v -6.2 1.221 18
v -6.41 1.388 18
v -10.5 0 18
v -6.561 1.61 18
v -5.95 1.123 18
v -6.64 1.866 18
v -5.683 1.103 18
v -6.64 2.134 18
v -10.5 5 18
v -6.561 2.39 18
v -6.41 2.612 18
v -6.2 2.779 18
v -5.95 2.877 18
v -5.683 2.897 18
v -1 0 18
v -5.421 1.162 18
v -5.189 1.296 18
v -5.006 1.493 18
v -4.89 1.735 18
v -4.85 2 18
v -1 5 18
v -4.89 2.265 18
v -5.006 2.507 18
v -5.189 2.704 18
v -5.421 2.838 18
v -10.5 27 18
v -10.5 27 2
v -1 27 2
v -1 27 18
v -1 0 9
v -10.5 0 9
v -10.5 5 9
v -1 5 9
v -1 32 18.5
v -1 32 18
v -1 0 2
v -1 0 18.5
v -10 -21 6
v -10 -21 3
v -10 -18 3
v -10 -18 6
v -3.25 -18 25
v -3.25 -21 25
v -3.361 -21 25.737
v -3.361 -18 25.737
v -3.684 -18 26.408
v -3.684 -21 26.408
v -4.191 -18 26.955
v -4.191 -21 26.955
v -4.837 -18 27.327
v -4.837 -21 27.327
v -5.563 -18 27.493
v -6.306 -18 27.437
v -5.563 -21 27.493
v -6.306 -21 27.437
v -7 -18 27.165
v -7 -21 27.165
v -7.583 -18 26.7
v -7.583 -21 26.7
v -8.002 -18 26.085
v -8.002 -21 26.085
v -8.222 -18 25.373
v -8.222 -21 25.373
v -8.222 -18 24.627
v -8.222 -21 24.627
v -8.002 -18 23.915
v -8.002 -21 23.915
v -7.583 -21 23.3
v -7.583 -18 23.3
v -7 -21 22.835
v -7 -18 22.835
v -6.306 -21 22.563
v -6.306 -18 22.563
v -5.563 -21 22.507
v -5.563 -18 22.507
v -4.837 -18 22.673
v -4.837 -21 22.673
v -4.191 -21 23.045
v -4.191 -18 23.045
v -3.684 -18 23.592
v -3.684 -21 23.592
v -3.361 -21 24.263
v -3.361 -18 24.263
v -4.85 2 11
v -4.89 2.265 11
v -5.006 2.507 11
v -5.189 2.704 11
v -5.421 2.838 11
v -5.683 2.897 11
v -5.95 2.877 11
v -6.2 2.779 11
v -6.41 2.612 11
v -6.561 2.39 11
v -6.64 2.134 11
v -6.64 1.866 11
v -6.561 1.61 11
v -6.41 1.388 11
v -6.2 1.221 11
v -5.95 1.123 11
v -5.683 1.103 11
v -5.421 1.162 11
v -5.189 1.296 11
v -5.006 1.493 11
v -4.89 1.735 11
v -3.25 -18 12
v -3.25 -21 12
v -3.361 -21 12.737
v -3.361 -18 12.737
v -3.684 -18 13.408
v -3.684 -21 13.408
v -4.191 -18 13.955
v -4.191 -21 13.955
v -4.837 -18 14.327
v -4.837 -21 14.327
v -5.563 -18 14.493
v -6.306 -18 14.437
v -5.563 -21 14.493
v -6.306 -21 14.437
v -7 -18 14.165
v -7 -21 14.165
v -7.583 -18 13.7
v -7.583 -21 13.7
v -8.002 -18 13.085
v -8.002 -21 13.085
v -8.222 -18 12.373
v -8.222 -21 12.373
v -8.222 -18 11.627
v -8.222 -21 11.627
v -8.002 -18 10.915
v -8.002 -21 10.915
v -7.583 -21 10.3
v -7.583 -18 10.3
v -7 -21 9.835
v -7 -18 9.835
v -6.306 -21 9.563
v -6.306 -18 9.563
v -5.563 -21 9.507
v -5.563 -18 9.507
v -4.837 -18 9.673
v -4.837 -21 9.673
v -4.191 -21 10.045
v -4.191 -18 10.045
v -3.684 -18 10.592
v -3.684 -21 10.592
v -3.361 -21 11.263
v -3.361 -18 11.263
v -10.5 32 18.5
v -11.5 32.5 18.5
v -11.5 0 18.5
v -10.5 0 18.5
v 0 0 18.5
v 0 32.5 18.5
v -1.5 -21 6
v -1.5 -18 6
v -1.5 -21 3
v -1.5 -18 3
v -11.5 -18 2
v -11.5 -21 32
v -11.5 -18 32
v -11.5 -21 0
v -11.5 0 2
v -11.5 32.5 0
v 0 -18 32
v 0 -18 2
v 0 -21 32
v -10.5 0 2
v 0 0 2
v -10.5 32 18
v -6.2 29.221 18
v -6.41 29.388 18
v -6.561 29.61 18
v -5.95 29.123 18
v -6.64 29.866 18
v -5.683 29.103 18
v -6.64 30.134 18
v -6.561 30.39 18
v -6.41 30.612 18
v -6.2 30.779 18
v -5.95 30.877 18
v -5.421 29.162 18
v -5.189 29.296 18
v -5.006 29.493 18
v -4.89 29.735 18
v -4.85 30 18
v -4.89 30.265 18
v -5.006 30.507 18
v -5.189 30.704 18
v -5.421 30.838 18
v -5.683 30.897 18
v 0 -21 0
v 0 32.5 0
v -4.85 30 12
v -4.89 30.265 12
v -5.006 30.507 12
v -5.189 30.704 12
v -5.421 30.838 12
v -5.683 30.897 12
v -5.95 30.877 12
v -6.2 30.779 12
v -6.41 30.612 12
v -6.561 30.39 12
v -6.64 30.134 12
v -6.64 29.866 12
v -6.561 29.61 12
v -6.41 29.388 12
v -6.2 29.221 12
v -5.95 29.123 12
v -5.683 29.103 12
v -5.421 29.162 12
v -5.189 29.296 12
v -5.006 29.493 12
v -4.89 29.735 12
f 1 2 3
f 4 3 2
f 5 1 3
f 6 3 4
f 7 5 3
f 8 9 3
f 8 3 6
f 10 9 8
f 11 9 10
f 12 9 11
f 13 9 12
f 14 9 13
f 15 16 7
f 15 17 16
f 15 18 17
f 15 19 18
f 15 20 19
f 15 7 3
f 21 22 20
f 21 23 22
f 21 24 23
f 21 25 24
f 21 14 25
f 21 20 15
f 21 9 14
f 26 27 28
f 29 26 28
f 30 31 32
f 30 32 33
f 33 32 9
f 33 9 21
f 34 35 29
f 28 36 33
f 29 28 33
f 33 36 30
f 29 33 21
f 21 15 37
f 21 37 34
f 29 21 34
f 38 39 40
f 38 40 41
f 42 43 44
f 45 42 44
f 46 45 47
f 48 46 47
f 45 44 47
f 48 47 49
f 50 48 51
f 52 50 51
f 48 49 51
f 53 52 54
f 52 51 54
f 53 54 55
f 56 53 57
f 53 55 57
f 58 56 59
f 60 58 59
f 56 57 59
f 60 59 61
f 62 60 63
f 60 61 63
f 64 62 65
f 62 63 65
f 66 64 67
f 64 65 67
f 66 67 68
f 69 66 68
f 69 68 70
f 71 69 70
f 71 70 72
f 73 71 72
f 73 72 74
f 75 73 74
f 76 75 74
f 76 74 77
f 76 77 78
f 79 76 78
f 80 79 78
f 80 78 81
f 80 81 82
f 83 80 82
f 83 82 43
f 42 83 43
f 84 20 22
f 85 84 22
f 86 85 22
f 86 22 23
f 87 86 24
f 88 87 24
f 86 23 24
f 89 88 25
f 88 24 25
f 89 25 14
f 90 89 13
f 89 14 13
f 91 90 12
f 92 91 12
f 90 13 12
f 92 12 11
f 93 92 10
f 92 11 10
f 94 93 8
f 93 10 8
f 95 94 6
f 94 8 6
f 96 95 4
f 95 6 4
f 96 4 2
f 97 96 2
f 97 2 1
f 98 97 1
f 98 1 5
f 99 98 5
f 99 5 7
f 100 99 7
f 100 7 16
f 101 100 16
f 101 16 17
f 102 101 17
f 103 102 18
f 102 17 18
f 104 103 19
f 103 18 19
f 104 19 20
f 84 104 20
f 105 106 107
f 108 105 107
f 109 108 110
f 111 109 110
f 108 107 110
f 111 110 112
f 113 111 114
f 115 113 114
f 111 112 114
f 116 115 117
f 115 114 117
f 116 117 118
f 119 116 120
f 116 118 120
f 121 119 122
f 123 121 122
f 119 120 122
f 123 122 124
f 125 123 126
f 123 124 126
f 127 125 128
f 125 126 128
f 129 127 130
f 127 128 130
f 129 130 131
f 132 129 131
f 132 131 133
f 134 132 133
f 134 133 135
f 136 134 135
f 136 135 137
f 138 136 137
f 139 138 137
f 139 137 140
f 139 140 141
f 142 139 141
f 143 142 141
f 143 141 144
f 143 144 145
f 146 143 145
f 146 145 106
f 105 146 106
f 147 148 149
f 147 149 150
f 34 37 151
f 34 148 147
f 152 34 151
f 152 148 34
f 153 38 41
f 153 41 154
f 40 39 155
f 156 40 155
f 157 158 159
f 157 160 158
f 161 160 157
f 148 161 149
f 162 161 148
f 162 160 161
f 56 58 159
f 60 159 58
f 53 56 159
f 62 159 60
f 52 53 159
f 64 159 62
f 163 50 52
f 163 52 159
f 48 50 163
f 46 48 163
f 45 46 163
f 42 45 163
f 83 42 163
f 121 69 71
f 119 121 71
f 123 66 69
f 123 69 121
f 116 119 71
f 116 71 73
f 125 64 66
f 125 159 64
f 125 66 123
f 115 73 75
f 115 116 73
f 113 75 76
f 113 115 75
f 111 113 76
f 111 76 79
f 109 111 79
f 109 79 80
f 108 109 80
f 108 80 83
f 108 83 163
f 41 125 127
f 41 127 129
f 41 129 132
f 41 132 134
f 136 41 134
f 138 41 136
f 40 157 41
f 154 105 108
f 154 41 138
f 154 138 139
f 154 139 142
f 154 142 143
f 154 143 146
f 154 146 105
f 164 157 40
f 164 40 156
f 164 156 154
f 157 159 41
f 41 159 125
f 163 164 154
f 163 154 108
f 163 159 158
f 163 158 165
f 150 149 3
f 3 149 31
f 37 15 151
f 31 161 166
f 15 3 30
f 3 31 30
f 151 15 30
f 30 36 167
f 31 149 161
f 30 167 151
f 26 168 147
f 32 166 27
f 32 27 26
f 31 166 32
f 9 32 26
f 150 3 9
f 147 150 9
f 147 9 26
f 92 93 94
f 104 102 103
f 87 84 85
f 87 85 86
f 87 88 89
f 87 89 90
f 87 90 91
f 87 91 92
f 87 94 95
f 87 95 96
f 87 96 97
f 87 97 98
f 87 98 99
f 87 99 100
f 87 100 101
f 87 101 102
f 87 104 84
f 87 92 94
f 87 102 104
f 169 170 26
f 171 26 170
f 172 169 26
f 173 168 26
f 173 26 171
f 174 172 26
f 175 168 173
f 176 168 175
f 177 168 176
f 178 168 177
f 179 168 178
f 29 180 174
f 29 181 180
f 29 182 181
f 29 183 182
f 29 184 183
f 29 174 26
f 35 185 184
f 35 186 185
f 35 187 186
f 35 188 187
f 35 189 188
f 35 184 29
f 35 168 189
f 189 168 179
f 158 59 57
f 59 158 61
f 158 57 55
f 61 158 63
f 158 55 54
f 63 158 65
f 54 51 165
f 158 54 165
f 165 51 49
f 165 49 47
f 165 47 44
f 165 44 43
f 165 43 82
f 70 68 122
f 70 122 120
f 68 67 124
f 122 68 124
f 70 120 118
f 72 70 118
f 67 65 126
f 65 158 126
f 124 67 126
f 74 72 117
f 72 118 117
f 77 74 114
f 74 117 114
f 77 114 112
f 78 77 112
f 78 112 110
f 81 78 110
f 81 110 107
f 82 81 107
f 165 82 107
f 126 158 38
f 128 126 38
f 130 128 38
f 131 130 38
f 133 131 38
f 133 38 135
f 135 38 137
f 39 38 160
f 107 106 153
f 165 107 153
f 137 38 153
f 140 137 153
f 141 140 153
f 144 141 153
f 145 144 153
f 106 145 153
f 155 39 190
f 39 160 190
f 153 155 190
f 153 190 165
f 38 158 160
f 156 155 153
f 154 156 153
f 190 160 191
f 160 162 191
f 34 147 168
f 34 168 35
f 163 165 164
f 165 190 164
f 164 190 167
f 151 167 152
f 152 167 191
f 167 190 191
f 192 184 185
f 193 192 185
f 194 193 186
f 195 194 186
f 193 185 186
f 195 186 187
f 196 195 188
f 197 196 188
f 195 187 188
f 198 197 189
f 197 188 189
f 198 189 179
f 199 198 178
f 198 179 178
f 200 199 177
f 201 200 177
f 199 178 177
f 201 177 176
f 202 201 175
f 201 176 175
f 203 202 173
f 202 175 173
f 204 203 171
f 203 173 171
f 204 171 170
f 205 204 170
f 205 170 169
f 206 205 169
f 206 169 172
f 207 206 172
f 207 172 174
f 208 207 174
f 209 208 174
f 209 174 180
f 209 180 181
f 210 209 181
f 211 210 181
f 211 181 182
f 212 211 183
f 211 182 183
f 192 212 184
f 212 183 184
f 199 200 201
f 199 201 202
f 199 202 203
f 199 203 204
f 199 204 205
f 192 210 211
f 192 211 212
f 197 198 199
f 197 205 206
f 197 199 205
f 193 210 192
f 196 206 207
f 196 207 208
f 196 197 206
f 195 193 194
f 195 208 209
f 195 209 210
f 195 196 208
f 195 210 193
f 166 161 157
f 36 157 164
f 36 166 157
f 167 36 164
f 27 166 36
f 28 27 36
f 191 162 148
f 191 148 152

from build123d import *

# Parameters (mm, degrees)
ESQUISSE1_W             = 11.5
ESQUISSE1_H             = 32.5
BOSS_EXTRU_1_DEPTH      = 18.5
ESQUISSE4_W             = 9.5
ESQUISSE4_H             = 32
ENL_V_MAT_EXTRU_1_DEPTH = 16.5
ESQUISSE5_W             = 9.5
ESQUISSE5_H             = 5
BOSS_EXTRU_2_DEPTH      = 16
ESQUISSE6_R             = 0.9
ENL_V_MAT_EXTRU_2_DEPTH = 6
ESQUISSE7_W             = 11.5
ESQUISSE7_H             = 2
BOSS_EXTRU_3_DEPTH      = 21
ESQUISSE9_W             = 9.5
ESQUISSE9_H             = 5
BOSS_EXTRU_4_DEPTH      = 16
ESQUISSE10_R            = 0.9
ENL_V_MAT_EXTRU_3_DEPTH = 7
ESQUISSE11_W            = 9.5
ESQUISSE11_H            = 7
ENL_V_MAT_EXTRU_4_DEPTH = 7
ESQUISSE12_W            = 11.5
ESQUISSE12_H            = 3
BOSS_EXTRU_5_DEPTH      = 30
ESQUISSE13_R            = 2.5
ENL_V_MAT_EXTRU_5_DEPTH = 10
ESQUISSE15_W            = 8.5
ESQUISSE15_H            = 3
ENL_V_MAT_EXTRU_6_DEPTH = 10


with BuildPart() as part:
    # Esquisse1 → Boss.-Extru.1 (new body)
    with BuildSketch(Plane.XY):
        with Locations((-5.75, 16.25)):
            Rectangle(ESQUISSE1_W, ESQUISSE1_H)
    extrude(amount=BOSS_EXTRU_1_DEPTH)

    # Esquisse4 → Enlèv. mat.-Extru.1 (cut)
    with BuildSketch(Plane.XY.offset(18.5)):
        with Locations((-5.75, 16)):
            Rectangle(ESQUISSE4_W, ESQUISSE4_H)
    extrude(amount=-ENL_V_MAT_EXTRU_1_DEPTH, mode=Mode.SUBTRACT)

    # Esquisse5 → Boss.-Extru.2 (add)
    with BuildSketch(Plane.XY.offset(2)):
        with Locations((-5.75, 29.5)):
            Rectangle(ESQUISSE5_W, ESQUISSE5_H)
    extrude(amount=BOSS_EXTRU_2_DEPTH)

    # Esquisse6 → Enlèv. mat.-Extru.2 (cut)
    with BuildSketch(Plane.XY.offset(18)):
        with Locations((-5.75, 30)):
            Circle(ESQUISSE6_R)
    extrude(amount=-ENL_V_MAT_EXTRU_2_DEPTH, mode=Mode.SUBTRACT)

    # Esquisse7 → Boss.-Extru.3 (add)
    with BuildSketch(Plane.XZ):
        with Locations((-5.75, 1)):
            Rectangle(ESQUISSE7_W, ESQUISSE7_H)
    extrude(amount=BOSS_EXTRU_3_DEPTH)

    # Esquisse9 → Boss.-Extru.4 (add)
    with BuildSketch(Plane.XY.offset(2)):
        with Locations((-5.75, 2.5)):
            Rectangle(ESQUISSE9_W, ESQUISSE9_H)
    extrude(amount=BOSS_EXTRU_4_DEPTH)

    # Esquisse10 → Enlèv. mat.-Extru.3 (cut)
    with BuildSketch(Plane.XY.offset(18)):
        with Locations((-5.75, 2)):
            Circle(ESQUISSE10_R)
    extrude(amount=-ENL_V_MAT_EXTRU_3_DEPTH, mode=Mode.SUBTRACT)

    # Esquisse11 → Enlèv. mat.-Extru.4 (cut)
    with BuildSketch(Plane.XZ):
        with Locations((-5.75, 5.5)):
            Rectangle(ESQUISSE11_W, ESQUISSE11_H)
    extrude(amount=-ENL_V_MAT_EXTRU_4_DEPTH, mode=Mode.SUBTRACT)

    # Esquisse12 → Boss.-Extru.5 (add)
    with BuildSketch(Plane.XY.offset(2)):
        with Locations((-5.75, -19.5)):
            Rectangle(ESQUISSE12_W, ESQUISSE12_H)
    extrude(amount=BOSS_EXTRU_5_DEPTH)

    # Esquisse13 → Enlèv. mat.-Extru.5 (cut)
    with BuildSketch(Plane.XZ.offset(21)):
        with Locations((-5.75, 12)):
            Circle(ESQUISSE13_R)
        with Locations((-5.75, 25)):
            Circle(ESQUISSE13_R)
    extrude(amount=-ENL_V_MAT_EXTRU_5_DEPTH, mode=Mode.SUBTRACT)

    # Esquisse15 → Enlèv. mat.-Extru.6 (cut)
    with BuildSketch(Plane.XZ.offset(21)):
        with Locations((-5.75, 4.5)):
            Rectangle(ESQUISSE15_W, ESQUISSE15_H)
    extrude(amount=-ENL_V_MAT_EXTRU_6_DEPTH, mode=Mode.SUBTRACT)


solid = part.part
